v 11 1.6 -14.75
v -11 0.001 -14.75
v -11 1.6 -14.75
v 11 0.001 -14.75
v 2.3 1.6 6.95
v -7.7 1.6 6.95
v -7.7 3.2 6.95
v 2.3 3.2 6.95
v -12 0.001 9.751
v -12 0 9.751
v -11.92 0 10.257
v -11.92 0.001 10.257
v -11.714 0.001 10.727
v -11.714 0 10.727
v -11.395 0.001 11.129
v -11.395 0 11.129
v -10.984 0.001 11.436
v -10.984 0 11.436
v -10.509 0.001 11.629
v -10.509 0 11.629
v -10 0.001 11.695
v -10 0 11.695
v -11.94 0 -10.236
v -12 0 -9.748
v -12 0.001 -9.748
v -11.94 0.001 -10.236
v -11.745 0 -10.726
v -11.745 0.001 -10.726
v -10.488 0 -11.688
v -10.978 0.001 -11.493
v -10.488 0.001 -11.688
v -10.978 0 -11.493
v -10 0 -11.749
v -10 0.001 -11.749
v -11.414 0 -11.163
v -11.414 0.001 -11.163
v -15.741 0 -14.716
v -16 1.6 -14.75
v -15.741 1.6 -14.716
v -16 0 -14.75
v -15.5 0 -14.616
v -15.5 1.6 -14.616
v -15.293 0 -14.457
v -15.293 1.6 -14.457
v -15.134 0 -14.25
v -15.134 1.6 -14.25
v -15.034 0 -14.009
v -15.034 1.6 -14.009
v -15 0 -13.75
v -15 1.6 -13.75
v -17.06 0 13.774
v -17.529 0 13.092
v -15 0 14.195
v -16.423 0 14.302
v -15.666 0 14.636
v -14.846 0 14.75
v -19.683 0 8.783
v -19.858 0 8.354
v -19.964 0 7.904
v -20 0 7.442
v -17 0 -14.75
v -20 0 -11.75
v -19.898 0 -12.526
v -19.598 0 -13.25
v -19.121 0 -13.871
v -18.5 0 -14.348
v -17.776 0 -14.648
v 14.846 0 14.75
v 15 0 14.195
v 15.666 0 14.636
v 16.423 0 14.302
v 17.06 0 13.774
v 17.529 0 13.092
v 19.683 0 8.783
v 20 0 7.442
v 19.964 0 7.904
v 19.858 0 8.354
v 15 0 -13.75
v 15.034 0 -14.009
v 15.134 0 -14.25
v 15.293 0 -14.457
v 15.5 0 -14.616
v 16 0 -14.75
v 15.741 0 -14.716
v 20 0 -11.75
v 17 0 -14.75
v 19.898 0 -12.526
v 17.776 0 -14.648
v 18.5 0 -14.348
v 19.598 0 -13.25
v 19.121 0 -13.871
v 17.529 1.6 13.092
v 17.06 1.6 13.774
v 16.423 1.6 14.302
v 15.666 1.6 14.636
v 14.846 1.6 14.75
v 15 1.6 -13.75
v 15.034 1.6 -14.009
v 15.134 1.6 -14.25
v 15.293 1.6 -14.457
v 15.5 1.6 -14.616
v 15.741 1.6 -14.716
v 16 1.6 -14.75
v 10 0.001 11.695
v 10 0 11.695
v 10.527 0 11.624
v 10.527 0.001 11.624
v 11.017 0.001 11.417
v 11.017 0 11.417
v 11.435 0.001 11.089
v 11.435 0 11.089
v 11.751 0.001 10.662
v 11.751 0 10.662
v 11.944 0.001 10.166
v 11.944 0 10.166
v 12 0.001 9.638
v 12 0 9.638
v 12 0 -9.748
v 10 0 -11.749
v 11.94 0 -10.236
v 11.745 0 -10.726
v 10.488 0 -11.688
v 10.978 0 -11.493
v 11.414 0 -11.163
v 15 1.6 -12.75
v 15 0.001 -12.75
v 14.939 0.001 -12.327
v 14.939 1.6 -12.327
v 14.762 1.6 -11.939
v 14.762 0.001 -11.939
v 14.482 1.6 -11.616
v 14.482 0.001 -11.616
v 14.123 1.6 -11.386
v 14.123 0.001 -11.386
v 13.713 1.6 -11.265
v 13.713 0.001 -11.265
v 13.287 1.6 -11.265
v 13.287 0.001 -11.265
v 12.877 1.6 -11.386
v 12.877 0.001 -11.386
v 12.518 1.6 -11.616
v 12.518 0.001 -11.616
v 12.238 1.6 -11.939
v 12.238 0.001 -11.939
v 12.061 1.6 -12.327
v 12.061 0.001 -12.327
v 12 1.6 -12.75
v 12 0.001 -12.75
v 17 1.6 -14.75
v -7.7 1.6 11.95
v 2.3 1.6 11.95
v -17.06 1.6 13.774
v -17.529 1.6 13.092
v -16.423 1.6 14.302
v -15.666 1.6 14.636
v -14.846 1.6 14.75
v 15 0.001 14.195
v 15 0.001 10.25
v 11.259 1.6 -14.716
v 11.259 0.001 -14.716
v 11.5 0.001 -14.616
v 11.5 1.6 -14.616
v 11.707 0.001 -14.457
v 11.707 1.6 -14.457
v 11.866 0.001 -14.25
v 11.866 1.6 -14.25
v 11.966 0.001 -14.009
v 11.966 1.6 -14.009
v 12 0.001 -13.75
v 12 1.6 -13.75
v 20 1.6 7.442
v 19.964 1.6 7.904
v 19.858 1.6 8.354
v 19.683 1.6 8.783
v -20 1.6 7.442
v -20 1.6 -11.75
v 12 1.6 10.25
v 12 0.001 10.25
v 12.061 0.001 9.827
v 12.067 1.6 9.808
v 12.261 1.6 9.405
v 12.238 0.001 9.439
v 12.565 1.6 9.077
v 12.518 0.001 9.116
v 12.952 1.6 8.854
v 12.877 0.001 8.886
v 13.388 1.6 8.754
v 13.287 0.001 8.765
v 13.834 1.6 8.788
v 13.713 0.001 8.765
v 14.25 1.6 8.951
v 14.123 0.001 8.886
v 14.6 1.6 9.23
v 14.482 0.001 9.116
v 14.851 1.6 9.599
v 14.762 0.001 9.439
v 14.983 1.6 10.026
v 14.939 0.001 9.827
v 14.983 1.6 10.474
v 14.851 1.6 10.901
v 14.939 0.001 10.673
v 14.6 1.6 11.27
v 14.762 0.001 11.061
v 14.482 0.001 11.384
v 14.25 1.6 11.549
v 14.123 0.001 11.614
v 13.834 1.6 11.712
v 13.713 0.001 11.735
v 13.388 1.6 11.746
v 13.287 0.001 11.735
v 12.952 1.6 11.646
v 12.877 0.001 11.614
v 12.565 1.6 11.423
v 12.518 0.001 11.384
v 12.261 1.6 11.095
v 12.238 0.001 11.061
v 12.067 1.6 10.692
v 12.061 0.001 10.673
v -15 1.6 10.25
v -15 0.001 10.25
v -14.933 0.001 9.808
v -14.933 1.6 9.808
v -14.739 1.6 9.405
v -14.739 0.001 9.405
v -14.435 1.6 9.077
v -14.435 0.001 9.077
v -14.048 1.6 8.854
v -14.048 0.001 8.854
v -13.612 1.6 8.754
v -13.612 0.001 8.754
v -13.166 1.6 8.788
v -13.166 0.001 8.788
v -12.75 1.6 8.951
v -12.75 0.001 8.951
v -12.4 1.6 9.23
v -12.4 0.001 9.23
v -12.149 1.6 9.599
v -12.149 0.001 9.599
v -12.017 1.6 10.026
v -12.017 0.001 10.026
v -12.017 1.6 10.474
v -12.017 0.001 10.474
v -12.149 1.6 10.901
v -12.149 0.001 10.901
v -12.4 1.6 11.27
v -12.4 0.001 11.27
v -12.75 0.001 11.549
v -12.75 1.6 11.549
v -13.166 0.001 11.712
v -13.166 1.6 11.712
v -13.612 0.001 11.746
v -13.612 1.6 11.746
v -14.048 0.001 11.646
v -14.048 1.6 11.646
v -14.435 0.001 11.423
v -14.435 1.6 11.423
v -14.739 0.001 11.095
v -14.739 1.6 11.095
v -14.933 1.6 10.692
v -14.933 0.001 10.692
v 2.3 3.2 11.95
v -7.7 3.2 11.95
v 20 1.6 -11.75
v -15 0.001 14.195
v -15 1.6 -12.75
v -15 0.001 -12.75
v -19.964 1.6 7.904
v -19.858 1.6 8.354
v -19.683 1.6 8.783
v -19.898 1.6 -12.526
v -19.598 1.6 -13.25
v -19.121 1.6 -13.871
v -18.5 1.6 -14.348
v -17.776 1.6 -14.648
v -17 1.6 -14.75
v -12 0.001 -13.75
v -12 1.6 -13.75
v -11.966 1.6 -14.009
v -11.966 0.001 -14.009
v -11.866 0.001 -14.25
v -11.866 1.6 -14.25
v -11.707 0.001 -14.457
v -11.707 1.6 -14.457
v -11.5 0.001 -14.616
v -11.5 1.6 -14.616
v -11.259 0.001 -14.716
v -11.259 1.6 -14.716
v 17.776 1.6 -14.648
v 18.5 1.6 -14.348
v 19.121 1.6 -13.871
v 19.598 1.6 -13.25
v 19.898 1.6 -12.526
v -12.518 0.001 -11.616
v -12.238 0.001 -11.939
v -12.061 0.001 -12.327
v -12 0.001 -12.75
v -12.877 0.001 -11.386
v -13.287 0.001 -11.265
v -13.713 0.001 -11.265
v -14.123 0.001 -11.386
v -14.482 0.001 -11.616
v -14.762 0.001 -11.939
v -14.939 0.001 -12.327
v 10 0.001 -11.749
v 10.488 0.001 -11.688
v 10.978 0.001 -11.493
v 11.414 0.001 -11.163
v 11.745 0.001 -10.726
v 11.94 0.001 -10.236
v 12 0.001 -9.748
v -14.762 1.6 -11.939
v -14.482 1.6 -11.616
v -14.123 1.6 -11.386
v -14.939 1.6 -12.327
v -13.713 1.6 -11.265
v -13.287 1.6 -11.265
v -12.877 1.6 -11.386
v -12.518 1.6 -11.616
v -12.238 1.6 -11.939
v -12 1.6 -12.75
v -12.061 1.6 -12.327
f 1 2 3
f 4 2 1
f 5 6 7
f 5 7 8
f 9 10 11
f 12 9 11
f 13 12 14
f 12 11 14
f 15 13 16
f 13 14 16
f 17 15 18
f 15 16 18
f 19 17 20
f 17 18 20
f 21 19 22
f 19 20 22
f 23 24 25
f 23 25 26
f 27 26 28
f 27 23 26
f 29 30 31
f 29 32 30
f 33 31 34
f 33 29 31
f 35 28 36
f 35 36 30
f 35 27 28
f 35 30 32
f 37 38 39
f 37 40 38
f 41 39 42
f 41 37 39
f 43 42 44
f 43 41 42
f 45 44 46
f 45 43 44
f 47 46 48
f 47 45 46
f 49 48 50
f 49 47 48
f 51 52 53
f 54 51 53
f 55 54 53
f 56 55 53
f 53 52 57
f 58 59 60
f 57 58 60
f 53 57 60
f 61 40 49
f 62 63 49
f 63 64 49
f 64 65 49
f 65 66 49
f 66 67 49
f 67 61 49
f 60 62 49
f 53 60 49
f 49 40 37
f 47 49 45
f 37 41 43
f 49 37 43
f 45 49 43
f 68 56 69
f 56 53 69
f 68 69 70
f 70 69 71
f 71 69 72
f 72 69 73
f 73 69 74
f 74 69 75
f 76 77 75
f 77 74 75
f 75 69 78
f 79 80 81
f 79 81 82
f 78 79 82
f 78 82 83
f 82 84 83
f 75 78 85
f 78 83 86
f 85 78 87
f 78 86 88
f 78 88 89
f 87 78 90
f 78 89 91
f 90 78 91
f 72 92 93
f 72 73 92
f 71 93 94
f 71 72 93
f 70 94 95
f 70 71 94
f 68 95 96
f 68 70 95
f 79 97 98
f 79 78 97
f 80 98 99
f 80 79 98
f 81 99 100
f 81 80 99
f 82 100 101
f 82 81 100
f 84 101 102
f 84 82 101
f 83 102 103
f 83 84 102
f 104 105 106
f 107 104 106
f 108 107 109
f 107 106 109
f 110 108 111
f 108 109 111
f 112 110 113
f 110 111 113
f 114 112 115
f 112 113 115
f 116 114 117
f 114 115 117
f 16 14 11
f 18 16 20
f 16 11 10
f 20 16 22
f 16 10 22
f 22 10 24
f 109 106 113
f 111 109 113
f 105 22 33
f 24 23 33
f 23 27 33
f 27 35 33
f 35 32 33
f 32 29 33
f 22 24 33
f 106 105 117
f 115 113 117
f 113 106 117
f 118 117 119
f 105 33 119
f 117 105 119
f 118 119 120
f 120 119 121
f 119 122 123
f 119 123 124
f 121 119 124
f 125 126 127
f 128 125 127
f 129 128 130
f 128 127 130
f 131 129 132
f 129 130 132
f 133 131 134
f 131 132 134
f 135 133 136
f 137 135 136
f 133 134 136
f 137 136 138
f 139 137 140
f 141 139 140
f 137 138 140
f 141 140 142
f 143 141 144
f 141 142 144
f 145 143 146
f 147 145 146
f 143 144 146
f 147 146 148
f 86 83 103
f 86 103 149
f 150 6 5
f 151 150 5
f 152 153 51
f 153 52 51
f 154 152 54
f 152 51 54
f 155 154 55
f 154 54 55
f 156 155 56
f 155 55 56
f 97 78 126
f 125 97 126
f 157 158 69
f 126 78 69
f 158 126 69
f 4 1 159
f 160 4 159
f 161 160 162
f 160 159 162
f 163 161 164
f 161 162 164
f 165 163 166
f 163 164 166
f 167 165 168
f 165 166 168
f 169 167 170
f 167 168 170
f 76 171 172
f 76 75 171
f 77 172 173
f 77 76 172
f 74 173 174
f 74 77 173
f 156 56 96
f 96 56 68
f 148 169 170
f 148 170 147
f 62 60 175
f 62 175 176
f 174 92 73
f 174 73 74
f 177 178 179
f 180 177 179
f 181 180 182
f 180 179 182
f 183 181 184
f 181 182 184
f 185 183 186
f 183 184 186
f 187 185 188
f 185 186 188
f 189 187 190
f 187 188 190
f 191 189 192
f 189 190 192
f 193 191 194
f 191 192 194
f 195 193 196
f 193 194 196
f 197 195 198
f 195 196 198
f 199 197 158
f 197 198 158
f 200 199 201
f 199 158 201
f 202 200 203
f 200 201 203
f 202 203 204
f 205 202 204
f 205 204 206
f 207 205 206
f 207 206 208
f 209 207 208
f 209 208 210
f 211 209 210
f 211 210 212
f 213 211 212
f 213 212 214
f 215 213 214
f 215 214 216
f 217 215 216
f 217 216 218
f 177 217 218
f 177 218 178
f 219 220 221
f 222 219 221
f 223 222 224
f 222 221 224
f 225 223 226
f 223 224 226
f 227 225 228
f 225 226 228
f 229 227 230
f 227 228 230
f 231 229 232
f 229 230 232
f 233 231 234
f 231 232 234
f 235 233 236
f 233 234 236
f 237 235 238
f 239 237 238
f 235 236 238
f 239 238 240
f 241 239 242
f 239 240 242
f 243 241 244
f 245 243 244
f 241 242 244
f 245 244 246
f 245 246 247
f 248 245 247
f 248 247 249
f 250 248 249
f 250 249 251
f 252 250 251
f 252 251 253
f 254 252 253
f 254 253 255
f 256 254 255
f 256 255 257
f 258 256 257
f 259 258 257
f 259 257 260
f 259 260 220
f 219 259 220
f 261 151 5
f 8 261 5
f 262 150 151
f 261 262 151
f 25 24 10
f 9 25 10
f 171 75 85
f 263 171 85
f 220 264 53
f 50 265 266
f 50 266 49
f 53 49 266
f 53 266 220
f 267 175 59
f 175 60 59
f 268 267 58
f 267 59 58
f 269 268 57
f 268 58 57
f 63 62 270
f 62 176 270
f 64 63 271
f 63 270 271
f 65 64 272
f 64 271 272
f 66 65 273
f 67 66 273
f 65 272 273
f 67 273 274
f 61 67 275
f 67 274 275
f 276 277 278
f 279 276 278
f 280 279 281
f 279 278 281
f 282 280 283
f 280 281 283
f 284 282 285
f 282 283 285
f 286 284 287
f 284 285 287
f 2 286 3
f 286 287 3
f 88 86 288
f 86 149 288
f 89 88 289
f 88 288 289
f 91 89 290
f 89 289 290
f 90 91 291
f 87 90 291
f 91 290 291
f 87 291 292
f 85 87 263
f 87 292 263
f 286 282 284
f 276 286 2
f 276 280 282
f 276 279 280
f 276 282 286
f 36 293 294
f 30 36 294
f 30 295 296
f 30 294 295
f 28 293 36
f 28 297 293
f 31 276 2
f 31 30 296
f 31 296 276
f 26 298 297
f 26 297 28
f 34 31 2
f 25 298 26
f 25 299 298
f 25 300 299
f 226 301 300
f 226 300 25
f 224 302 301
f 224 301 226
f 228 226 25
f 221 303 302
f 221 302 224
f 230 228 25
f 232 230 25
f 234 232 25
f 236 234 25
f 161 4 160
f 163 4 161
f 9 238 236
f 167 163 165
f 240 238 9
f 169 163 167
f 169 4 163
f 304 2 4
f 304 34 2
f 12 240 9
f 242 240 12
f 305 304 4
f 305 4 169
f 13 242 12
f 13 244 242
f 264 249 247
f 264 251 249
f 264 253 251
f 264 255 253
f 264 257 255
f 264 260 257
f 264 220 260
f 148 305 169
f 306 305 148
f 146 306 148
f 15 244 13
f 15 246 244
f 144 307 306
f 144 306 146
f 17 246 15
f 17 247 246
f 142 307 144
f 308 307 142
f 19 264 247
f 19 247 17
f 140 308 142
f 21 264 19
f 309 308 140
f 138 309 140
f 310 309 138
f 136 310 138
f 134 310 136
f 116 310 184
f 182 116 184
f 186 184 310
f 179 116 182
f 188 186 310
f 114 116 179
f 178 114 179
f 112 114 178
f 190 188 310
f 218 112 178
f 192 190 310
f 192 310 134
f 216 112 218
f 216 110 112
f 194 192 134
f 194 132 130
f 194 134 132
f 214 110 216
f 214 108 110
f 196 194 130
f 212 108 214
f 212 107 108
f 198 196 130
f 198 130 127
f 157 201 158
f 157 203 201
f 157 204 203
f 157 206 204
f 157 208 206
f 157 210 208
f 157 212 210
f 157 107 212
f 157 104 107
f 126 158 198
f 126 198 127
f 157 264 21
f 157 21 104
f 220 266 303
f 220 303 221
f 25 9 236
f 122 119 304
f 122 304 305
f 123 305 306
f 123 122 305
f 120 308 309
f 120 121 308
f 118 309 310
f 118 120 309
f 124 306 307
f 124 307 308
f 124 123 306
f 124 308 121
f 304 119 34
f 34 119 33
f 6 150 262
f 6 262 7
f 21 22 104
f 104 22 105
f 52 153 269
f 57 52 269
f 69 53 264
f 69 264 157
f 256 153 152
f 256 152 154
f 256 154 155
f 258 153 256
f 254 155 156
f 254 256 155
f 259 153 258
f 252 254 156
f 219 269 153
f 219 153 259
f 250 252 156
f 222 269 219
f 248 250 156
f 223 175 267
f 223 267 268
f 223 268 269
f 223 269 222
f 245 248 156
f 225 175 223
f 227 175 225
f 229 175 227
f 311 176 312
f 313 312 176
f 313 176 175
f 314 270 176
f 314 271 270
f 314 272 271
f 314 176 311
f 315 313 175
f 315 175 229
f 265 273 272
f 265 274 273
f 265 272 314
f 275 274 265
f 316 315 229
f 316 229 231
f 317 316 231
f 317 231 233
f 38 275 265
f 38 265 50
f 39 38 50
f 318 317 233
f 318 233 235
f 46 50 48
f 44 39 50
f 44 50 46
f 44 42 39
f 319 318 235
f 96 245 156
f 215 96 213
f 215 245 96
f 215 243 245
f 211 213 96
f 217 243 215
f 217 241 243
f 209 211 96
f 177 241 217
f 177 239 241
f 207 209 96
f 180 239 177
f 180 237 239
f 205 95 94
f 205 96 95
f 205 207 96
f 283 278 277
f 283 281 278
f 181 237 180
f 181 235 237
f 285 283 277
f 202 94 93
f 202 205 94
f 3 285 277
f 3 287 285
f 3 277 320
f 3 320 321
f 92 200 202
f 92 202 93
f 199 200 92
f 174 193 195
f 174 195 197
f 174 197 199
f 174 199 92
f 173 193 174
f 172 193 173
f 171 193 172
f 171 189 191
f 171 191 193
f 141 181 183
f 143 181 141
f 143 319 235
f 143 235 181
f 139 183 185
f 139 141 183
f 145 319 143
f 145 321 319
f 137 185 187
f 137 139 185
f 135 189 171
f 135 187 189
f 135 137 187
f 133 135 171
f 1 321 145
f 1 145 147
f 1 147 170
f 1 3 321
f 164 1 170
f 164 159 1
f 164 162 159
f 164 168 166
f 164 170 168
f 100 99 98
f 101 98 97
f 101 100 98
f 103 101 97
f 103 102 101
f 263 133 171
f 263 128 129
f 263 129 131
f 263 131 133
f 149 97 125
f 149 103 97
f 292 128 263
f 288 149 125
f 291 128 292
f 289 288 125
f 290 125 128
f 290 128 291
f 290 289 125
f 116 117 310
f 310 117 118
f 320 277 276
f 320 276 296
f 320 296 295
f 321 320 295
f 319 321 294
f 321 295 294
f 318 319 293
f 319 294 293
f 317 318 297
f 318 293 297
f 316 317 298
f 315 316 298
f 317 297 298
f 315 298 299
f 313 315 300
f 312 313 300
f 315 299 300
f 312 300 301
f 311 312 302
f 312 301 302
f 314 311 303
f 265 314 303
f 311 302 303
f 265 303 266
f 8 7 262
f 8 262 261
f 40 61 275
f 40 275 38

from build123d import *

# Parameters (mm, degrees)
SKETCH1_W                = 40
SKETCH1_H                = 29.5
BOSS_EXTRUDE1_DEPTH      = 1.6
CUT_EXTRUDE4_DEPTH       = 2.6
FILLET1_R                = 3
M2_CLEARANCE_HOLE1_D     = 3
M2_CLEARANCE_HOLE1_DEPTH = 5.2
M2_CLEARANCE_HOLE1_TIP   = 0.901290929
CUT_EXTRUDE1_DEPTH       = 1
CUT_EXTRUDE1_DEPTH_BACK  = 2.6
FILLET2_R                = 1
SKETCH11_W               = 30
SKETCH11_H               = 28.944863729
SKETCH11_R               = 1
CUT_EXTRUDE3_DEPTH       = 0.001
SKETCH13_W               = 10
SKETCH13_H               = 5
BOSS_EXTRUDE2_DEPTH      = 1.6


with BuildPart() as part:
    # Sketch1 → Boss-Extrude1 (new body)
    with BuildSketch(Plane(origin=(0, 0, 0), x_dir=(1, 0, 0), z_dir=(0, 1, 0))):
        Rectangle(SKETCH1_W, SKETCH1_H)
    extrude(amount=BOSS_EXTRUDE1_DEPTH)

    # Sketch12 → Cut-Extrude4 (cut, through all)
    with BuildSketch(Plane(origin=(0, 1.6, 0), x_dir=(1, 0, 0), z_dir=(0, 1, 0))):
        Polygon((-16.7, -14.75), (-20, -8.15), (-20, -14.75), align=None)
        Polygon((16.7, -14.75), (20, -8.15), (20, -14.75), align=None)
    extrude(amount=-CUT_EXTRUDE4_DEPTH, mode=Mode.SUBTRACT)

    # Fillet1
    fillet1_edges = [part.edges().sort_by_distance(p)[0] for p in [
        (-16.7, 0.8, 14.75),
        (-20, 0.8, 8.15),
        (16.7, 0.8, 14.75),
        (20, 0.8, 8.15),
        (-20, 0.8, -14.75),
        (20, 0.8, -14.75),
    ]]
    fillet(fillet1_edges, radius=FILLET1_R)

    # M2 Clearance Hole1
    with Locations(Plane(origin=(0, 1.6, 0), x_dir=(1, 0, 0), z_dir=(0, 1, 0))):
        with Locations((-13.5, 12.75), (13.5, 12.75), (13.5, -10.25), (-13.5, -10.25)):
            Hole(M2_CLEARANCE_HOLE1_D / 2, depth=M2_CLEARANCE_HOLE1_DEPTH)
            with Locations((0, 0, -(M2_CLEARANCE_HOLE1_DEPTH + M2_CLEARANCE_HOLE1_TIP / 2))):  # 118° drill point
                Cone(0, M2_CLEARANCE_HOLE1_D / 2, M2_CLEARANCE_HOLE1_TIP, mode=Mode.SUBTRACT)

    # Sketch5 → Cut-Extrude1 (cut, two sides)
    with BuildSketch(Plane(origin=(0, 1.6, 0), x_dir=(1, 0, 0), z_dir=(0, 1, 0))) as cut_extrude1_sk:
        with BuildLine():
            Line((-15, 12.75), (-15, 19.75))
            ThreePointArc((-15, 19.75), (-13.5, 21.25), (-12, 19.75))
            Line((-12, 19.75), (-12, 12.75))
            ThreePointArc((-12, 12.75), (-13.5, 11.25), (-15, 12.75))
        make_face()
        with BuildLine():
            Line((15, 12.75), (15, 19.75))
            ThreePointArc((15, 19.75), (13.5, 21.25), (12, 19.75))
            Line((12, 19.75), (12, 12.75))
            ThreePointArc((12, 12.75), (13.5, 11.25), (15, 12.75))
        make_face()
    extrude(amount=CUT_EXTRUDE1_DEPTH, mode=Mode.SUBTRACT)
    extrude(cut_extrude1_sk.sketch, amount=-CUT_EXTRUDE1_DEPTH_BACK, mode=Mode.SUBTRACT)

    # Fillet2
    fillet2_edges = [part.edges().sort_by_distance(p)[0] for p in [
        (-15, 0.8, -14.75),
        (-12, 0.8, -14.75),
        (12, 0.8, -14.75),
        (15, 0.8, -14.75),
    ]]
    fillet(fillet2_edges, radius=FILLET2_R)

    # Sketch11 → Cut-Extrude3 (cut)
    with BuildSketch(Plane.XZ):
        with Locations((0, -0.277568136)):
            Rectangle(SKETCH11_W, SKETCH11_H)
        with Locations((13.5, -12.75)):
            Circle(SKETCH11_R, mode=Mode.SUBTRACT)
        with Locations((13.5, 10.25)):
            Circle(SKETCH11_R, mode=Mode.SUBTRACT)
        with Locations((-13.5, -12.75)):
            Circle(SKETCH11_R, mode=Mode.SUBTRACT)
        with Locations((-13.5, 10.25)):
            Circle(SKETCH11_R, mode=Mode.SUBTRACT)
        with BuildLine():
            Line((-10, 11.694863729), (10, 11.694863729))
            ThreePointArc((10, 11.694863729), (11.434632325, 11.088706998), (12, 9.637516011))
            Line((12, 9.637516011), (12, -9.74800182))
            add(Edge.make_bspline(
                [(10, -11.748801092), (12, -11.748801092), (12, -9.74800182)],
                knots=[3.141592654, 3.141592654, 3.141592654, 4.71238898, 4.71238898, 4.71238898], degree=2, weights=[1, 0.707106781, 1]))
            Line((10, -11.748801092), (-10, -11.748801092))
            add(Edge.make_bspline(
                [(-12, -9.74800182), (-12, -11.748801092), (-10, -11.748801092)],
                knots=[1.570796327, 1.570796327, 1.570796327, 3.141592654, 3.141592654, 3.141592654], degree=2, weights=[1, 0.707106781, 1]))
            Line((-12, -9.74800182), (-12, 9.750612903))
            ThreePointArc((-12, 9.750612903), (-11.394642541, 11.128696782), (-10, 11.694863729))
        make_face(mode=Mode.SUBTRACT)
    extrude(amount=-CUT_EXTRUDE3_DEPTH, mode=Mode.SUBTRACT)


with BuildPart() as body_2:
    # Sketch13 → Boss-Extrude2 (new body)
    with BuildSketch(Plane(origin=(0, 1.6, 0), x_dir=(1, 0, 0), z_dir=(0, 1, 0))):
        with Locations((-2.7, -9.45)):
            Rectangle(SKETCH13_W, SKETCH13_H)
    extrude(amount=BOSS_EXTRUDE2_DEPTH)


solid = Compound([part.part, body_2.part])
